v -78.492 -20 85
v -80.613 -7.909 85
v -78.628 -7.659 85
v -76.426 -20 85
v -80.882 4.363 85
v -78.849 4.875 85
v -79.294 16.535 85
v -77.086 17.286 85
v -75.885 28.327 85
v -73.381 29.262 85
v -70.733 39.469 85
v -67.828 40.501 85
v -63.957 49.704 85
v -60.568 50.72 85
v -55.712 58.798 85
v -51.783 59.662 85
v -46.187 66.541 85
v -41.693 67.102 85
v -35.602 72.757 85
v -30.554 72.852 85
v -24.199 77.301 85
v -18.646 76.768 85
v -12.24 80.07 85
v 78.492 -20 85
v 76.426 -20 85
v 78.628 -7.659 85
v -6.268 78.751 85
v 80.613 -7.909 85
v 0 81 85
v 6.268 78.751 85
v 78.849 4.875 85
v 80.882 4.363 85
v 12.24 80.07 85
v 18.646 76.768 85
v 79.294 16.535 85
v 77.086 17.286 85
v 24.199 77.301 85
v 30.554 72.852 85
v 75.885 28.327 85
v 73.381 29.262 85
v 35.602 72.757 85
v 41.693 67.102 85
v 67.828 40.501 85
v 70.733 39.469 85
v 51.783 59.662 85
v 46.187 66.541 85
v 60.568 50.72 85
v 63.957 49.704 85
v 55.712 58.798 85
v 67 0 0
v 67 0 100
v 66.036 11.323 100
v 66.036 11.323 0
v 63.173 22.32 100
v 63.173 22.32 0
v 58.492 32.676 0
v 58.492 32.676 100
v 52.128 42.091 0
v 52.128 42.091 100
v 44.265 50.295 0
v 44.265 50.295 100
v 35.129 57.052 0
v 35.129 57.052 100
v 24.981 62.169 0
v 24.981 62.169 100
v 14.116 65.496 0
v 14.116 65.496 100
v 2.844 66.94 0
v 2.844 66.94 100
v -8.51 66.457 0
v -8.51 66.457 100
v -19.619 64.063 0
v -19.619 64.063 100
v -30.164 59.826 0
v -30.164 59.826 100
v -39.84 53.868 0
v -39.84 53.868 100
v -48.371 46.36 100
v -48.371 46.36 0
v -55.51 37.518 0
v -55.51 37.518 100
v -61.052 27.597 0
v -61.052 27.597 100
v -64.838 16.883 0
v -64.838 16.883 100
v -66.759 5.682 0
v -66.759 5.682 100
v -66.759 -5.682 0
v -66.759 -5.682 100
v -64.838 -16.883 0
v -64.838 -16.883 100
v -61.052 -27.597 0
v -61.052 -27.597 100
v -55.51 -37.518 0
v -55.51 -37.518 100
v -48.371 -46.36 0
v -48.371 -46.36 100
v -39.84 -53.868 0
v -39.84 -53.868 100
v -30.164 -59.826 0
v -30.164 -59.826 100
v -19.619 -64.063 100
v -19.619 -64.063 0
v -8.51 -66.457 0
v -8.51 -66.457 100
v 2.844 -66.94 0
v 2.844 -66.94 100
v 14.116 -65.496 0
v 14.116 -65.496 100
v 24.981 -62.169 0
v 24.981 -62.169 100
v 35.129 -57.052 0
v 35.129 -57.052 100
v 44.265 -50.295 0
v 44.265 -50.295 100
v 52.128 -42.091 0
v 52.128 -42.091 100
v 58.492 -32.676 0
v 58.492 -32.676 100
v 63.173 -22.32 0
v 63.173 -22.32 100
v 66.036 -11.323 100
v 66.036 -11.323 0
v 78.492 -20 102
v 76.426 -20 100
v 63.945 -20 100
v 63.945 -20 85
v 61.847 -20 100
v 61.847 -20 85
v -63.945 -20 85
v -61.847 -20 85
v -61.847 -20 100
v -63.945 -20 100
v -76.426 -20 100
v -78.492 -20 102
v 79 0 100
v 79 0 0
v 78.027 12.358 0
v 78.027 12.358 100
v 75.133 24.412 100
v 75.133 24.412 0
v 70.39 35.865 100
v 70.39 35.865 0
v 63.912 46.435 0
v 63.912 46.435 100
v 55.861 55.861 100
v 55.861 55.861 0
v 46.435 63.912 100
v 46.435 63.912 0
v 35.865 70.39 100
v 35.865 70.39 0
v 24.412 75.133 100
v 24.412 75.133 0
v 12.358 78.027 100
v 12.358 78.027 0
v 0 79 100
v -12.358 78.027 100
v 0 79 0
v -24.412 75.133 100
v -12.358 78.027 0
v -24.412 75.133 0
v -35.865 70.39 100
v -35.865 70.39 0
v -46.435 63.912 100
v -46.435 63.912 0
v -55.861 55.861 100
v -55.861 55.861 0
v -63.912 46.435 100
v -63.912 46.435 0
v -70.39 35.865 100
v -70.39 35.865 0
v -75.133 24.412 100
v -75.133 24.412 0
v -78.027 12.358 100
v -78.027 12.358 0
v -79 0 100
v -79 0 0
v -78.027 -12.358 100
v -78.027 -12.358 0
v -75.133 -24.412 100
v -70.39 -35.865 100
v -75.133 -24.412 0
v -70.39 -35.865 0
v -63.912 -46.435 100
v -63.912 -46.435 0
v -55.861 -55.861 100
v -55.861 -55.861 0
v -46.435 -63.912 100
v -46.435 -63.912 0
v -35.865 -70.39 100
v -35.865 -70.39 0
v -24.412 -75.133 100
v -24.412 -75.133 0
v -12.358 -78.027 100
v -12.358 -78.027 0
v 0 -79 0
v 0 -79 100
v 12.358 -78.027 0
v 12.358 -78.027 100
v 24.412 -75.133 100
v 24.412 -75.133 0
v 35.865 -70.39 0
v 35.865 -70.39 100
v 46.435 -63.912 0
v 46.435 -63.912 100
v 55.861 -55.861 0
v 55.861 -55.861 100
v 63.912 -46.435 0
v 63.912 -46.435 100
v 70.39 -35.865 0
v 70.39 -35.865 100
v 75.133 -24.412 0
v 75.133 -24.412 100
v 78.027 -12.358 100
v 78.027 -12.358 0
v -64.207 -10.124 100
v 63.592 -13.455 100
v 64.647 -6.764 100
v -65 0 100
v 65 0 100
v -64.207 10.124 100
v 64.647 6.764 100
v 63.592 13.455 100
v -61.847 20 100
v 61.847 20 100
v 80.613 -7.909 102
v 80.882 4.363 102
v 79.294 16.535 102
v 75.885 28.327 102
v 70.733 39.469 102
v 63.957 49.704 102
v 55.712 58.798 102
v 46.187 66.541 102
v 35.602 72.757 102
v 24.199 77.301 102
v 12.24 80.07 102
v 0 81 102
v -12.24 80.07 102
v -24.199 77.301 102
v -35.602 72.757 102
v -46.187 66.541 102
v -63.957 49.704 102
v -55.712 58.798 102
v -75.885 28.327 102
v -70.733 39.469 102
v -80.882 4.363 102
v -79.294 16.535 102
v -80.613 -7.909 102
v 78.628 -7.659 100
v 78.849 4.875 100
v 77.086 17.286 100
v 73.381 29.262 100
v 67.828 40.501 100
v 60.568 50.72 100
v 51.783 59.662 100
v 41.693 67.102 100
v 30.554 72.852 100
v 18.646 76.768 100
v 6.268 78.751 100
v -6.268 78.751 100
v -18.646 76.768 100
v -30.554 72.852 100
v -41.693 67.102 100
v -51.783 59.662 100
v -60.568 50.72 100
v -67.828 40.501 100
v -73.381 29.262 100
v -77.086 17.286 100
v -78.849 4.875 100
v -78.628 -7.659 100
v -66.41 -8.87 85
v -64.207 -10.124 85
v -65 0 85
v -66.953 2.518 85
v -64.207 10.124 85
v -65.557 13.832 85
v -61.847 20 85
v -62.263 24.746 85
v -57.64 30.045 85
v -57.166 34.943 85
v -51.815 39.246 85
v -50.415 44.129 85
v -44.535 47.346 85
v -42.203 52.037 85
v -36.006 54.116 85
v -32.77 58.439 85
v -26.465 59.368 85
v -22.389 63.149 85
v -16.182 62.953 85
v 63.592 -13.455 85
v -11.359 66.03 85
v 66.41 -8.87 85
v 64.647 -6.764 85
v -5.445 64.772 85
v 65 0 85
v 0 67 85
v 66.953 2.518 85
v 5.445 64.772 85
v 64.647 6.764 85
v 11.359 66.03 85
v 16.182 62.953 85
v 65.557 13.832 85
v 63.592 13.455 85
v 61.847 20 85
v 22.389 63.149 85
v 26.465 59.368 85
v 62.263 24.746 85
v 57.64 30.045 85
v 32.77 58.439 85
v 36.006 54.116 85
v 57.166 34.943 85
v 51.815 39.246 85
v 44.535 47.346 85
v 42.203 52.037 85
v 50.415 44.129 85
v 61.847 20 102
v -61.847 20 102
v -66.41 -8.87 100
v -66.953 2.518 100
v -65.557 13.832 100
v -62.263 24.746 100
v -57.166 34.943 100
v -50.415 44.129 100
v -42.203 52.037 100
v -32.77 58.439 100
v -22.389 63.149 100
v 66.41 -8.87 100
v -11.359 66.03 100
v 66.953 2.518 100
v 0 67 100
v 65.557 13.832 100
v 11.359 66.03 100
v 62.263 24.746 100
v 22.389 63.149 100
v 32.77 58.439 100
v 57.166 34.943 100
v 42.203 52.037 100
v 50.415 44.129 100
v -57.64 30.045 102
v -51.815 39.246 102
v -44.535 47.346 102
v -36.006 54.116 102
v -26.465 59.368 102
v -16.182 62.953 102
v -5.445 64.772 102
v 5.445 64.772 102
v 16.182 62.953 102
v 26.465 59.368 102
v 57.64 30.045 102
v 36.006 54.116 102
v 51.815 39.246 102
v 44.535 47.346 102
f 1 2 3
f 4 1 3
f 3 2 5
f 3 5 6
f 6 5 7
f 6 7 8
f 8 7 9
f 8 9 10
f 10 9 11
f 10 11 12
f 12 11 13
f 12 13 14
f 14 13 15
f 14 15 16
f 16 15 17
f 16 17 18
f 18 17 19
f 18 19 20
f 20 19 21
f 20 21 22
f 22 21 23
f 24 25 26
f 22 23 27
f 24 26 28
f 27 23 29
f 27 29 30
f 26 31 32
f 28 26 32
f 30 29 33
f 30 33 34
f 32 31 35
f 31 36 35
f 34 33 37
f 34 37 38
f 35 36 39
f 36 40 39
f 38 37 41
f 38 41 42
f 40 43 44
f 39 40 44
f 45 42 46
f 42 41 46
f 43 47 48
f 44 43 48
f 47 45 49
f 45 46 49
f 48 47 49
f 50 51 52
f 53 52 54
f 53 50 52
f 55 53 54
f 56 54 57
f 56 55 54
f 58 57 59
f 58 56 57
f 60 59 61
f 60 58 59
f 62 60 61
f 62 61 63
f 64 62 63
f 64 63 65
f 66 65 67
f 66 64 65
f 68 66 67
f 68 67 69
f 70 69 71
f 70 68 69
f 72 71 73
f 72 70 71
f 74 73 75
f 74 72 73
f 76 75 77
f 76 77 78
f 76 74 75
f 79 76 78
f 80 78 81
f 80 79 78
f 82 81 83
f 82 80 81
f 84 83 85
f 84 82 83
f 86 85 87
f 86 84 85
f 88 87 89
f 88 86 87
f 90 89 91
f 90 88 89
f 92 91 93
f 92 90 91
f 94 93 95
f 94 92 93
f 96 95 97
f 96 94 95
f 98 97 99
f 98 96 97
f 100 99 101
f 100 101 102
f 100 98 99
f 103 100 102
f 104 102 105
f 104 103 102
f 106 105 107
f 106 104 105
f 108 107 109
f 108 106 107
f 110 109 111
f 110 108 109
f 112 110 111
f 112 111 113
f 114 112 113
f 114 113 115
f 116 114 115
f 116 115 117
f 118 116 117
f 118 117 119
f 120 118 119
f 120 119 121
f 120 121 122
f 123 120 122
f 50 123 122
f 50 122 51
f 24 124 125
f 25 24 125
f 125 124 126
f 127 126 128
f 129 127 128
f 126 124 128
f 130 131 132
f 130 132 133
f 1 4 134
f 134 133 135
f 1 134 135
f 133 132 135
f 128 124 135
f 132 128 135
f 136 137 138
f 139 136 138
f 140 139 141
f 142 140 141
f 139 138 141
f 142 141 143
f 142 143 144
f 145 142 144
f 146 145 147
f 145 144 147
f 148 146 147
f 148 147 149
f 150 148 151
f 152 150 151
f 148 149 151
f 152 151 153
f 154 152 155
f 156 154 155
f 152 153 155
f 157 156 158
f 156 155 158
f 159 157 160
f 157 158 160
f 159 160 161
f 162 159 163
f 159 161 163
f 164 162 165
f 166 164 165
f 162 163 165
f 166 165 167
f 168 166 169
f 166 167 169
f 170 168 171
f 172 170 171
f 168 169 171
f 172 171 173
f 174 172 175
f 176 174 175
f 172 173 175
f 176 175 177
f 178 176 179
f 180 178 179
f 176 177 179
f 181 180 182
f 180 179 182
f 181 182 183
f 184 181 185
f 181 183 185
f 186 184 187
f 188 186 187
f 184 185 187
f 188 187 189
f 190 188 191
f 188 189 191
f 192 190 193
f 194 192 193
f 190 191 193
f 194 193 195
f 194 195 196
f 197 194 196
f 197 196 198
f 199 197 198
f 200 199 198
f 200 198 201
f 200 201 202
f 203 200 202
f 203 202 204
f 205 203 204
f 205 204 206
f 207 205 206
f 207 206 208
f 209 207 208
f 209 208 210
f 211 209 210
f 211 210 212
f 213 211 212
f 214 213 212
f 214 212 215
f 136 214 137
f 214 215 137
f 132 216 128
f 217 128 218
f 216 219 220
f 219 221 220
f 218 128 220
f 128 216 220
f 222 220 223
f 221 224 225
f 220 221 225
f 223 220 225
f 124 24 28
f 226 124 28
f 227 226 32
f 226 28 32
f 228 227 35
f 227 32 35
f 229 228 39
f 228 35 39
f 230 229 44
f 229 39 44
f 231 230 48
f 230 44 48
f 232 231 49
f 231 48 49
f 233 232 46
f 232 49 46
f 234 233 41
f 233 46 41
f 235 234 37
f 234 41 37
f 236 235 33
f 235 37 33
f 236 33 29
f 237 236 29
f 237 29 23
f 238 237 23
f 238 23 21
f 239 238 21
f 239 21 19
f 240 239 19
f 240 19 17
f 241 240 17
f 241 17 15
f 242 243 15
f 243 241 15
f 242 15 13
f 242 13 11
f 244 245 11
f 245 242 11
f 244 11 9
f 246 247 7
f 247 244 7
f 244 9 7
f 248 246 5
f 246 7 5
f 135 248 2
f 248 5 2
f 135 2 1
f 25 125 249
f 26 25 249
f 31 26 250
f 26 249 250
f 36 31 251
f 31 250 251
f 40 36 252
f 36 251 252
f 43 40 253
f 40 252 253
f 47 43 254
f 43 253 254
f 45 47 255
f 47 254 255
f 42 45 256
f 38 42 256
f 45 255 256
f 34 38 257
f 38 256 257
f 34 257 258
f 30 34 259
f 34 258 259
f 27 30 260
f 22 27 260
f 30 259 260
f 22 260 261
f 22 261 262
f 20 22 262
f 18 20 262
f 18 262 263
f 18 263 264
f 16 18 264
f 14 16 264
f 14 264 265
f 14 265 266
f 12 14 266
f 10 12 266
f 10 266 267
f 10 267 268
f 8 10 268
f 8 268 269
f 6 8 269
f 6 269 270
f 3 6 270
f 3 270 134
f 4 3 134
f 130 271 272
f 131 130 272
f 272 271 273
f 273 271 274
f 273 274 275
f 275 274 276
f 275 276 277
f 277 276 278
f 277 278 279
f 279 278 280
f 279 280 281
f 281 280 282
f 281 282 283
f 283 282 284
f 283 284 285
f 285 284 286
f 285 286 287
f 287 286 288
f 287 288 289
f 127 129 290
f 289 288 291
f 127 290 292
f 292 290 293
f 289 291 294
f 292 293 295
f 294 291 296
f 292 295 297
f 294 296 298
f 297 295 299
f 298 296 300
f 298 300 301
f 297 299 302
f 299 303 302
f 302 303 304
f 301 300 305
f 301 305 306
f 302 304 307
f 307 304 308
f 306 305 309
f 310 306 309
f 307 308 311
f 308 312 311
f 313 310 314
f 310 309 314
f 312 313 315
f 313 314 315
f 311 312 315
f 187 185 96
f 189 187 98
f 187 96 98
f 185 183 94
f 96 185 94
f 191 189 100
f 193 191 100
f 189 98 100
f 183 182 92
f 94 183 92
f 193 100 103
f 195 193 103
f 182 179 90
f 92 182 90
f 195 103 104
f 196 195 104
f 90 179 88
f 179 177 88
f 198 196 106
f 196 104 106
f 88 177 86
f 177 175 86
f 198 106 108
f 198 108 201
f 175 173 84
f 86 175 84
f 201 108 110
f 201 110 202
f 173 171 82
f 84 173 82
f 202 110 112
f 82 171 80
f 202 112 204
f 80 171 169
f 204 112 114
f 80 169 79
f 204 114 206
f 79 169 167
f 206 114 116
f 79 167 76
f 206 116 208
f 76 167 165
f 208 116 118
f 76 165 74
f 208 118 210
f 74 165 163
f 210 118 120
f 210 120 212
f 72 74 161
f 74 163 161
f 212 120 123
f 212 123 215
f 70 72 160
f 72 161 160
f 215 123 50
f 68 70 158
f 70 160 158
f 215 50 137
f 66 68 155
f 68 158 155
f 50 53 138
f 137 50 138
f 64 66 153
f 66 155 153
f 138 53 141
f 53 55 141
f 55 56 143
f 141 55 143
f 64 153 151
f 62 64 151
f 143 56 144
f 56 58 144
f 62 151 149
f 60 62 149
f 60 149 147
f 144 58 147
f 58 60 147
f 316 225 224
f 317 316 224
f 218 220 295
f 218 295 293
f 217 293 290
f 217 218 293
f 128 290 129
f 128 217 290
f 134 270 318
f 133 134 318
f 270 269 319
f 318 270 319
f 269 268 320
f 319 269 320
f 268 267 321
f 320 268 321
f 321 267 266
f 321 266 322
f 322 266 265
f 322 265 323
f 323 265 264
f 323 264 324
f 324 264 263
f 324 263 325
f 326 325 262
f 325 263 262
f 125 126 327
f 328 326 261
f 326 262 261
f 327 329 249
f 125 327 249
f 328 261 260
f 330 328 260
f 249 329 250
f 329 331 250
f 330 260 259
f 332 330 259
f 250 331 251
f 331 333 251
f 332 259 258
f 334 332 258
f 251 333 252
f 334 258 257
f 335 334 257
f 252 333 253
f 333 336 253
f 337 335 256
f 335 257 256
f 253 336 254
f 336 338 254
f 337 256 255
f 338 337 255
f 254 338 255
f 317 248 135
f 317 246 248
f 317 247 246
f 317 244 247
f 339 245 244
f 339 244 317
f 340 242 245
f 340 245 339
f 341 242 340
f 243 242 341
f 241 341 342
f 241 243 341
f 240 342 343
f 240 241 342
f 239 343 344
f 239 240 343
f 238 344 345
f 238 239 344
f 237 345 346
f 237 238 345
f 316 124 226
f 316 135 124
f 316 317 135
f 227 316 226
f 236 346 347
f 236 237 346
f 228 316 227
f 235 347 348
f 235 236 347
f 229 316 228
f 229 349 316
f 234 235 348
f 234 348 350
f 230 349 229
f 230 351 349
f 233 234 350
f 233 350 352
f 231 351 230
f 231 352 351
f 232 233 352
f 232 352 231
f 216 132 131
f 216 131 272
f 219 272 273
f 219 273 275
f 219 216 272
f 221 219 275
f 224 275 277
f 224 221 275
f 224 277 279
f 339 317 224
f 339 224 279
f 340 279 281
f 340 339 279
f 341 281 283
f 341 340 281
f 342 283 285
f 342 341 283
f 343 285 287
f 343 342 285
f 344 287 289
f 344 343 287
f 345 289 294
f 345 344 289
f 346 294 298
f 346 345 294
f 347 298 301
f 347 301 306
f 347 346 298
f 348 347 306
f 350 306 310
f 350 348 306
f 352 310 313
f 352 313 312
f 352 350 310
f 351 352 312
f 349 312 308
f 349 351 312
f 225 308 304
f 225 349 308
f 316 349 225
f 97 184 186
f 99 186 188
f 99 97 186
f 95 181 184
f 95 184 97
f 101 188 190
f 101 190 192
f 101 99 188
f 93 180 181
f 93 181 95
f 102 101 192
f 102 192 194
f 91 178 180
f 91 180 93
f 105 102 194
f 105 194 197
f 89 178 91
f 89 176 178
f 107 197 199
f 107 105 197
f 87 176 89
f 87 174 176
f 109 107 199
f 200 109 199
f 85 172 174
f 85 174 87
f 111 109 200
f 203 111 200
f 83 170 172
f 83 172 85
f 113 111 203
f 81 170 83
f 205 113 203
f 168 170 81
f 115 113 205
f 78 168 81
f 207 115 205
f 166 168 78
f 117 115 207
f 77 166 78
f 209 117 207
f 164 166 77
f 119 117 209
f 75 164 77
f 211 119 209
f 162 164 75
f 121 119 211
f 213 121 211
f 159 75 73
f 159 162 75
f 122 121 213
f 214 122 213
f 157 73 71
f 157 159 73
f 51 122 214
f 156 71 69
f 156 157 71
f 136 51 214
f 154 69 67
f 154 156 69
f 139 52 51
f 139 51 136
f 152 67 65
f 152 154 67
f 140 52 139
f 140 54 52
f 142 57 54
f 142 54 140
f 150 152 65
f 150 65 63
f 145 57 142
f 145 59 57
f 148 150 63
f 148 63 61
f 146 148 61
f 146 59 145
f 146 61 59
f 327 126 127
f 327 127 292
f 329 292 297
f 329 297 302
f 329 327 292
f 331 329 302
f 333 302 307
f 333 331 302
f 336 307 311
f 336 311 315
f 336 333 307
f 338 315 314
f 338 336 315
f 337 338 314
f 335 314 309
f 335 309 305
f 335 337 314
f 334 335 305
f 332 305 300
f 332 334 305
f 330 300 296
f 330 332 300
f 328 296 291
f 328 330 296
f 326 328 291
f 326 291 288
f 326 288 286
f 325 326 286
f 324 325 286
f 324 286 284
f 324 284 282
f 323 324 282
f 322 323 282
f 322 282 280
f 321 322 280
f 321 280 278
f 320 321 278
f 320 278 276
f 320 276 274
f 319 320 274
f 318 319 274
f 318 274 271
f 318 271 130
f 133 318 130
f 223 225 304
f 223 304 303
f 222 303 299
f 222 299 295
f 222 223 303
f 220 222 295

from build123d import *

# Parameters (mm, degrees)
F0_R        = 79
F0_R_2      = 67
F1_DEPTH    = 100
F2_R        = 81
F2_R_2      = 79
F3_DEPTH    = 15
F2_R_3      = 67
F1_FACE_R   = 79
F1_FACE_R_2 = 67
F4_DEPTH    = 2
F6_DEPTH    = 25


with BuildPart() as f1:
    # F0 (on Top) → F1 (new body)
    with BuildSketch(Plane.XY):
        Circle(F0_R)
        Circle(F0_R_2, mode=Mode.SUBTRACT)
    extrude(amount=F1_DEPTH)


with BuildPart() as f3:
    # F2 (on face) → F3 (new body)
    with BuildSketch(Plane.XY.offset(100)):
        Circle(F2_R)
        Circle(F2_R_2, mode=Mode.SUBTRACT)
    extrude(amount=-F3_DEPTH)



with BuildPart() as f3b:
    # F2 (on face) → F3, piece 2 (new body)
    with BuildSketch(Plane.XY.offset(100)):
        Circle(F2_R_3)
        with BuildLine():
            ThreePointArc((61.8465843843, 20), (64.2068064343, 10.1235373023), (65, 0))
            ThreePointArc((65, 0), (64.2068064343, -10.1235373023), (61.8465843843, -20))
            ThreePointArc((61.8465843843, -20), (0, -65), (-61.8465843843, -20))
            ThreePointArc((-61.8465843843, -20), (-65, 0), (-61.8465843843, 20))
            ThreePointArc((-61.8465843843, 20), (0, 65), (61.8465843843, 20))
        make_face(mode=Mode.SUBTRACT)
    extrude(amount=-F3_DEPTH)


with BuildPart() as f3_1:
    add(f3.part)

    add(f3b.part)  # F4 merges F3b
    # F2 (on face) + F1_face (on face) → F4 (join)
    with BuildSketch(Plane.XY.offset(100)):
        Circle(F2_R)
        Circle(F2_R_2, mode=Mode.SUBTRACT)
        Circle(F2_R_3)
        with BuildLine():
            ThreePointArc((61.8465843843, 20), (64.2068064343, 10.1235373023), (65, 0))
            ThreePointArc((65, 0), (64.2068064343, -10.1235373023), (61.8465843843, -20))
            ThreePointArc((61.8465843843, -20), (0, -65), (-61.8465843843, -20))
            ThreePointArc((-61.8465843843, -20), (-65, 0), (-61.8465843843, 20))
            ThreePointArc((-61.8465843843, 20), (0, 65), (61.8465843843, 20))
        make_face(mode=Mode.SUBTRACT)
        with BuildLine():
            ThreePointArc((61.8465843843, -20), (64.2068064343, -10.1235373023), (65, 0))
            ThreePointArc((65, 0), (64.2068064343, 10.1235373023), (61.8465843843, 20))
            Line((61.8465843843, 20), (-61.8465843843, 20))
            ThreePointArc((-61.8465843843, 20), (-65, 0), (-61.8465843843, -20))
            Line((-61.8465843843, -20), (61.8465843843, -20))
        make_face()
    with BuildSketch(Plane.XY.offset(100)):
        Circle(F1_FACE_R)
        Circle(F1_FACE_R_2, mode=Mode.SUBTRACT)
    extrude(amount=F4_DEPTH)

    # F5 (on face) → F6 (cut)
    with BuildSketch(Plane.XY.offset(102)):
        Polygon((109.0431064367, -96.566259861), (109.0431064367, -20), (61.8465843843, -20), (-61.8465843843, -20), (-82.0130482316, -20), (-82.0130482316, -96.566259861), align=None)
    extrude(amount=-F6_DEPTH, mode=Mode.SUBTRACT)


solid = Compound([f1.part, f3_1.part])
